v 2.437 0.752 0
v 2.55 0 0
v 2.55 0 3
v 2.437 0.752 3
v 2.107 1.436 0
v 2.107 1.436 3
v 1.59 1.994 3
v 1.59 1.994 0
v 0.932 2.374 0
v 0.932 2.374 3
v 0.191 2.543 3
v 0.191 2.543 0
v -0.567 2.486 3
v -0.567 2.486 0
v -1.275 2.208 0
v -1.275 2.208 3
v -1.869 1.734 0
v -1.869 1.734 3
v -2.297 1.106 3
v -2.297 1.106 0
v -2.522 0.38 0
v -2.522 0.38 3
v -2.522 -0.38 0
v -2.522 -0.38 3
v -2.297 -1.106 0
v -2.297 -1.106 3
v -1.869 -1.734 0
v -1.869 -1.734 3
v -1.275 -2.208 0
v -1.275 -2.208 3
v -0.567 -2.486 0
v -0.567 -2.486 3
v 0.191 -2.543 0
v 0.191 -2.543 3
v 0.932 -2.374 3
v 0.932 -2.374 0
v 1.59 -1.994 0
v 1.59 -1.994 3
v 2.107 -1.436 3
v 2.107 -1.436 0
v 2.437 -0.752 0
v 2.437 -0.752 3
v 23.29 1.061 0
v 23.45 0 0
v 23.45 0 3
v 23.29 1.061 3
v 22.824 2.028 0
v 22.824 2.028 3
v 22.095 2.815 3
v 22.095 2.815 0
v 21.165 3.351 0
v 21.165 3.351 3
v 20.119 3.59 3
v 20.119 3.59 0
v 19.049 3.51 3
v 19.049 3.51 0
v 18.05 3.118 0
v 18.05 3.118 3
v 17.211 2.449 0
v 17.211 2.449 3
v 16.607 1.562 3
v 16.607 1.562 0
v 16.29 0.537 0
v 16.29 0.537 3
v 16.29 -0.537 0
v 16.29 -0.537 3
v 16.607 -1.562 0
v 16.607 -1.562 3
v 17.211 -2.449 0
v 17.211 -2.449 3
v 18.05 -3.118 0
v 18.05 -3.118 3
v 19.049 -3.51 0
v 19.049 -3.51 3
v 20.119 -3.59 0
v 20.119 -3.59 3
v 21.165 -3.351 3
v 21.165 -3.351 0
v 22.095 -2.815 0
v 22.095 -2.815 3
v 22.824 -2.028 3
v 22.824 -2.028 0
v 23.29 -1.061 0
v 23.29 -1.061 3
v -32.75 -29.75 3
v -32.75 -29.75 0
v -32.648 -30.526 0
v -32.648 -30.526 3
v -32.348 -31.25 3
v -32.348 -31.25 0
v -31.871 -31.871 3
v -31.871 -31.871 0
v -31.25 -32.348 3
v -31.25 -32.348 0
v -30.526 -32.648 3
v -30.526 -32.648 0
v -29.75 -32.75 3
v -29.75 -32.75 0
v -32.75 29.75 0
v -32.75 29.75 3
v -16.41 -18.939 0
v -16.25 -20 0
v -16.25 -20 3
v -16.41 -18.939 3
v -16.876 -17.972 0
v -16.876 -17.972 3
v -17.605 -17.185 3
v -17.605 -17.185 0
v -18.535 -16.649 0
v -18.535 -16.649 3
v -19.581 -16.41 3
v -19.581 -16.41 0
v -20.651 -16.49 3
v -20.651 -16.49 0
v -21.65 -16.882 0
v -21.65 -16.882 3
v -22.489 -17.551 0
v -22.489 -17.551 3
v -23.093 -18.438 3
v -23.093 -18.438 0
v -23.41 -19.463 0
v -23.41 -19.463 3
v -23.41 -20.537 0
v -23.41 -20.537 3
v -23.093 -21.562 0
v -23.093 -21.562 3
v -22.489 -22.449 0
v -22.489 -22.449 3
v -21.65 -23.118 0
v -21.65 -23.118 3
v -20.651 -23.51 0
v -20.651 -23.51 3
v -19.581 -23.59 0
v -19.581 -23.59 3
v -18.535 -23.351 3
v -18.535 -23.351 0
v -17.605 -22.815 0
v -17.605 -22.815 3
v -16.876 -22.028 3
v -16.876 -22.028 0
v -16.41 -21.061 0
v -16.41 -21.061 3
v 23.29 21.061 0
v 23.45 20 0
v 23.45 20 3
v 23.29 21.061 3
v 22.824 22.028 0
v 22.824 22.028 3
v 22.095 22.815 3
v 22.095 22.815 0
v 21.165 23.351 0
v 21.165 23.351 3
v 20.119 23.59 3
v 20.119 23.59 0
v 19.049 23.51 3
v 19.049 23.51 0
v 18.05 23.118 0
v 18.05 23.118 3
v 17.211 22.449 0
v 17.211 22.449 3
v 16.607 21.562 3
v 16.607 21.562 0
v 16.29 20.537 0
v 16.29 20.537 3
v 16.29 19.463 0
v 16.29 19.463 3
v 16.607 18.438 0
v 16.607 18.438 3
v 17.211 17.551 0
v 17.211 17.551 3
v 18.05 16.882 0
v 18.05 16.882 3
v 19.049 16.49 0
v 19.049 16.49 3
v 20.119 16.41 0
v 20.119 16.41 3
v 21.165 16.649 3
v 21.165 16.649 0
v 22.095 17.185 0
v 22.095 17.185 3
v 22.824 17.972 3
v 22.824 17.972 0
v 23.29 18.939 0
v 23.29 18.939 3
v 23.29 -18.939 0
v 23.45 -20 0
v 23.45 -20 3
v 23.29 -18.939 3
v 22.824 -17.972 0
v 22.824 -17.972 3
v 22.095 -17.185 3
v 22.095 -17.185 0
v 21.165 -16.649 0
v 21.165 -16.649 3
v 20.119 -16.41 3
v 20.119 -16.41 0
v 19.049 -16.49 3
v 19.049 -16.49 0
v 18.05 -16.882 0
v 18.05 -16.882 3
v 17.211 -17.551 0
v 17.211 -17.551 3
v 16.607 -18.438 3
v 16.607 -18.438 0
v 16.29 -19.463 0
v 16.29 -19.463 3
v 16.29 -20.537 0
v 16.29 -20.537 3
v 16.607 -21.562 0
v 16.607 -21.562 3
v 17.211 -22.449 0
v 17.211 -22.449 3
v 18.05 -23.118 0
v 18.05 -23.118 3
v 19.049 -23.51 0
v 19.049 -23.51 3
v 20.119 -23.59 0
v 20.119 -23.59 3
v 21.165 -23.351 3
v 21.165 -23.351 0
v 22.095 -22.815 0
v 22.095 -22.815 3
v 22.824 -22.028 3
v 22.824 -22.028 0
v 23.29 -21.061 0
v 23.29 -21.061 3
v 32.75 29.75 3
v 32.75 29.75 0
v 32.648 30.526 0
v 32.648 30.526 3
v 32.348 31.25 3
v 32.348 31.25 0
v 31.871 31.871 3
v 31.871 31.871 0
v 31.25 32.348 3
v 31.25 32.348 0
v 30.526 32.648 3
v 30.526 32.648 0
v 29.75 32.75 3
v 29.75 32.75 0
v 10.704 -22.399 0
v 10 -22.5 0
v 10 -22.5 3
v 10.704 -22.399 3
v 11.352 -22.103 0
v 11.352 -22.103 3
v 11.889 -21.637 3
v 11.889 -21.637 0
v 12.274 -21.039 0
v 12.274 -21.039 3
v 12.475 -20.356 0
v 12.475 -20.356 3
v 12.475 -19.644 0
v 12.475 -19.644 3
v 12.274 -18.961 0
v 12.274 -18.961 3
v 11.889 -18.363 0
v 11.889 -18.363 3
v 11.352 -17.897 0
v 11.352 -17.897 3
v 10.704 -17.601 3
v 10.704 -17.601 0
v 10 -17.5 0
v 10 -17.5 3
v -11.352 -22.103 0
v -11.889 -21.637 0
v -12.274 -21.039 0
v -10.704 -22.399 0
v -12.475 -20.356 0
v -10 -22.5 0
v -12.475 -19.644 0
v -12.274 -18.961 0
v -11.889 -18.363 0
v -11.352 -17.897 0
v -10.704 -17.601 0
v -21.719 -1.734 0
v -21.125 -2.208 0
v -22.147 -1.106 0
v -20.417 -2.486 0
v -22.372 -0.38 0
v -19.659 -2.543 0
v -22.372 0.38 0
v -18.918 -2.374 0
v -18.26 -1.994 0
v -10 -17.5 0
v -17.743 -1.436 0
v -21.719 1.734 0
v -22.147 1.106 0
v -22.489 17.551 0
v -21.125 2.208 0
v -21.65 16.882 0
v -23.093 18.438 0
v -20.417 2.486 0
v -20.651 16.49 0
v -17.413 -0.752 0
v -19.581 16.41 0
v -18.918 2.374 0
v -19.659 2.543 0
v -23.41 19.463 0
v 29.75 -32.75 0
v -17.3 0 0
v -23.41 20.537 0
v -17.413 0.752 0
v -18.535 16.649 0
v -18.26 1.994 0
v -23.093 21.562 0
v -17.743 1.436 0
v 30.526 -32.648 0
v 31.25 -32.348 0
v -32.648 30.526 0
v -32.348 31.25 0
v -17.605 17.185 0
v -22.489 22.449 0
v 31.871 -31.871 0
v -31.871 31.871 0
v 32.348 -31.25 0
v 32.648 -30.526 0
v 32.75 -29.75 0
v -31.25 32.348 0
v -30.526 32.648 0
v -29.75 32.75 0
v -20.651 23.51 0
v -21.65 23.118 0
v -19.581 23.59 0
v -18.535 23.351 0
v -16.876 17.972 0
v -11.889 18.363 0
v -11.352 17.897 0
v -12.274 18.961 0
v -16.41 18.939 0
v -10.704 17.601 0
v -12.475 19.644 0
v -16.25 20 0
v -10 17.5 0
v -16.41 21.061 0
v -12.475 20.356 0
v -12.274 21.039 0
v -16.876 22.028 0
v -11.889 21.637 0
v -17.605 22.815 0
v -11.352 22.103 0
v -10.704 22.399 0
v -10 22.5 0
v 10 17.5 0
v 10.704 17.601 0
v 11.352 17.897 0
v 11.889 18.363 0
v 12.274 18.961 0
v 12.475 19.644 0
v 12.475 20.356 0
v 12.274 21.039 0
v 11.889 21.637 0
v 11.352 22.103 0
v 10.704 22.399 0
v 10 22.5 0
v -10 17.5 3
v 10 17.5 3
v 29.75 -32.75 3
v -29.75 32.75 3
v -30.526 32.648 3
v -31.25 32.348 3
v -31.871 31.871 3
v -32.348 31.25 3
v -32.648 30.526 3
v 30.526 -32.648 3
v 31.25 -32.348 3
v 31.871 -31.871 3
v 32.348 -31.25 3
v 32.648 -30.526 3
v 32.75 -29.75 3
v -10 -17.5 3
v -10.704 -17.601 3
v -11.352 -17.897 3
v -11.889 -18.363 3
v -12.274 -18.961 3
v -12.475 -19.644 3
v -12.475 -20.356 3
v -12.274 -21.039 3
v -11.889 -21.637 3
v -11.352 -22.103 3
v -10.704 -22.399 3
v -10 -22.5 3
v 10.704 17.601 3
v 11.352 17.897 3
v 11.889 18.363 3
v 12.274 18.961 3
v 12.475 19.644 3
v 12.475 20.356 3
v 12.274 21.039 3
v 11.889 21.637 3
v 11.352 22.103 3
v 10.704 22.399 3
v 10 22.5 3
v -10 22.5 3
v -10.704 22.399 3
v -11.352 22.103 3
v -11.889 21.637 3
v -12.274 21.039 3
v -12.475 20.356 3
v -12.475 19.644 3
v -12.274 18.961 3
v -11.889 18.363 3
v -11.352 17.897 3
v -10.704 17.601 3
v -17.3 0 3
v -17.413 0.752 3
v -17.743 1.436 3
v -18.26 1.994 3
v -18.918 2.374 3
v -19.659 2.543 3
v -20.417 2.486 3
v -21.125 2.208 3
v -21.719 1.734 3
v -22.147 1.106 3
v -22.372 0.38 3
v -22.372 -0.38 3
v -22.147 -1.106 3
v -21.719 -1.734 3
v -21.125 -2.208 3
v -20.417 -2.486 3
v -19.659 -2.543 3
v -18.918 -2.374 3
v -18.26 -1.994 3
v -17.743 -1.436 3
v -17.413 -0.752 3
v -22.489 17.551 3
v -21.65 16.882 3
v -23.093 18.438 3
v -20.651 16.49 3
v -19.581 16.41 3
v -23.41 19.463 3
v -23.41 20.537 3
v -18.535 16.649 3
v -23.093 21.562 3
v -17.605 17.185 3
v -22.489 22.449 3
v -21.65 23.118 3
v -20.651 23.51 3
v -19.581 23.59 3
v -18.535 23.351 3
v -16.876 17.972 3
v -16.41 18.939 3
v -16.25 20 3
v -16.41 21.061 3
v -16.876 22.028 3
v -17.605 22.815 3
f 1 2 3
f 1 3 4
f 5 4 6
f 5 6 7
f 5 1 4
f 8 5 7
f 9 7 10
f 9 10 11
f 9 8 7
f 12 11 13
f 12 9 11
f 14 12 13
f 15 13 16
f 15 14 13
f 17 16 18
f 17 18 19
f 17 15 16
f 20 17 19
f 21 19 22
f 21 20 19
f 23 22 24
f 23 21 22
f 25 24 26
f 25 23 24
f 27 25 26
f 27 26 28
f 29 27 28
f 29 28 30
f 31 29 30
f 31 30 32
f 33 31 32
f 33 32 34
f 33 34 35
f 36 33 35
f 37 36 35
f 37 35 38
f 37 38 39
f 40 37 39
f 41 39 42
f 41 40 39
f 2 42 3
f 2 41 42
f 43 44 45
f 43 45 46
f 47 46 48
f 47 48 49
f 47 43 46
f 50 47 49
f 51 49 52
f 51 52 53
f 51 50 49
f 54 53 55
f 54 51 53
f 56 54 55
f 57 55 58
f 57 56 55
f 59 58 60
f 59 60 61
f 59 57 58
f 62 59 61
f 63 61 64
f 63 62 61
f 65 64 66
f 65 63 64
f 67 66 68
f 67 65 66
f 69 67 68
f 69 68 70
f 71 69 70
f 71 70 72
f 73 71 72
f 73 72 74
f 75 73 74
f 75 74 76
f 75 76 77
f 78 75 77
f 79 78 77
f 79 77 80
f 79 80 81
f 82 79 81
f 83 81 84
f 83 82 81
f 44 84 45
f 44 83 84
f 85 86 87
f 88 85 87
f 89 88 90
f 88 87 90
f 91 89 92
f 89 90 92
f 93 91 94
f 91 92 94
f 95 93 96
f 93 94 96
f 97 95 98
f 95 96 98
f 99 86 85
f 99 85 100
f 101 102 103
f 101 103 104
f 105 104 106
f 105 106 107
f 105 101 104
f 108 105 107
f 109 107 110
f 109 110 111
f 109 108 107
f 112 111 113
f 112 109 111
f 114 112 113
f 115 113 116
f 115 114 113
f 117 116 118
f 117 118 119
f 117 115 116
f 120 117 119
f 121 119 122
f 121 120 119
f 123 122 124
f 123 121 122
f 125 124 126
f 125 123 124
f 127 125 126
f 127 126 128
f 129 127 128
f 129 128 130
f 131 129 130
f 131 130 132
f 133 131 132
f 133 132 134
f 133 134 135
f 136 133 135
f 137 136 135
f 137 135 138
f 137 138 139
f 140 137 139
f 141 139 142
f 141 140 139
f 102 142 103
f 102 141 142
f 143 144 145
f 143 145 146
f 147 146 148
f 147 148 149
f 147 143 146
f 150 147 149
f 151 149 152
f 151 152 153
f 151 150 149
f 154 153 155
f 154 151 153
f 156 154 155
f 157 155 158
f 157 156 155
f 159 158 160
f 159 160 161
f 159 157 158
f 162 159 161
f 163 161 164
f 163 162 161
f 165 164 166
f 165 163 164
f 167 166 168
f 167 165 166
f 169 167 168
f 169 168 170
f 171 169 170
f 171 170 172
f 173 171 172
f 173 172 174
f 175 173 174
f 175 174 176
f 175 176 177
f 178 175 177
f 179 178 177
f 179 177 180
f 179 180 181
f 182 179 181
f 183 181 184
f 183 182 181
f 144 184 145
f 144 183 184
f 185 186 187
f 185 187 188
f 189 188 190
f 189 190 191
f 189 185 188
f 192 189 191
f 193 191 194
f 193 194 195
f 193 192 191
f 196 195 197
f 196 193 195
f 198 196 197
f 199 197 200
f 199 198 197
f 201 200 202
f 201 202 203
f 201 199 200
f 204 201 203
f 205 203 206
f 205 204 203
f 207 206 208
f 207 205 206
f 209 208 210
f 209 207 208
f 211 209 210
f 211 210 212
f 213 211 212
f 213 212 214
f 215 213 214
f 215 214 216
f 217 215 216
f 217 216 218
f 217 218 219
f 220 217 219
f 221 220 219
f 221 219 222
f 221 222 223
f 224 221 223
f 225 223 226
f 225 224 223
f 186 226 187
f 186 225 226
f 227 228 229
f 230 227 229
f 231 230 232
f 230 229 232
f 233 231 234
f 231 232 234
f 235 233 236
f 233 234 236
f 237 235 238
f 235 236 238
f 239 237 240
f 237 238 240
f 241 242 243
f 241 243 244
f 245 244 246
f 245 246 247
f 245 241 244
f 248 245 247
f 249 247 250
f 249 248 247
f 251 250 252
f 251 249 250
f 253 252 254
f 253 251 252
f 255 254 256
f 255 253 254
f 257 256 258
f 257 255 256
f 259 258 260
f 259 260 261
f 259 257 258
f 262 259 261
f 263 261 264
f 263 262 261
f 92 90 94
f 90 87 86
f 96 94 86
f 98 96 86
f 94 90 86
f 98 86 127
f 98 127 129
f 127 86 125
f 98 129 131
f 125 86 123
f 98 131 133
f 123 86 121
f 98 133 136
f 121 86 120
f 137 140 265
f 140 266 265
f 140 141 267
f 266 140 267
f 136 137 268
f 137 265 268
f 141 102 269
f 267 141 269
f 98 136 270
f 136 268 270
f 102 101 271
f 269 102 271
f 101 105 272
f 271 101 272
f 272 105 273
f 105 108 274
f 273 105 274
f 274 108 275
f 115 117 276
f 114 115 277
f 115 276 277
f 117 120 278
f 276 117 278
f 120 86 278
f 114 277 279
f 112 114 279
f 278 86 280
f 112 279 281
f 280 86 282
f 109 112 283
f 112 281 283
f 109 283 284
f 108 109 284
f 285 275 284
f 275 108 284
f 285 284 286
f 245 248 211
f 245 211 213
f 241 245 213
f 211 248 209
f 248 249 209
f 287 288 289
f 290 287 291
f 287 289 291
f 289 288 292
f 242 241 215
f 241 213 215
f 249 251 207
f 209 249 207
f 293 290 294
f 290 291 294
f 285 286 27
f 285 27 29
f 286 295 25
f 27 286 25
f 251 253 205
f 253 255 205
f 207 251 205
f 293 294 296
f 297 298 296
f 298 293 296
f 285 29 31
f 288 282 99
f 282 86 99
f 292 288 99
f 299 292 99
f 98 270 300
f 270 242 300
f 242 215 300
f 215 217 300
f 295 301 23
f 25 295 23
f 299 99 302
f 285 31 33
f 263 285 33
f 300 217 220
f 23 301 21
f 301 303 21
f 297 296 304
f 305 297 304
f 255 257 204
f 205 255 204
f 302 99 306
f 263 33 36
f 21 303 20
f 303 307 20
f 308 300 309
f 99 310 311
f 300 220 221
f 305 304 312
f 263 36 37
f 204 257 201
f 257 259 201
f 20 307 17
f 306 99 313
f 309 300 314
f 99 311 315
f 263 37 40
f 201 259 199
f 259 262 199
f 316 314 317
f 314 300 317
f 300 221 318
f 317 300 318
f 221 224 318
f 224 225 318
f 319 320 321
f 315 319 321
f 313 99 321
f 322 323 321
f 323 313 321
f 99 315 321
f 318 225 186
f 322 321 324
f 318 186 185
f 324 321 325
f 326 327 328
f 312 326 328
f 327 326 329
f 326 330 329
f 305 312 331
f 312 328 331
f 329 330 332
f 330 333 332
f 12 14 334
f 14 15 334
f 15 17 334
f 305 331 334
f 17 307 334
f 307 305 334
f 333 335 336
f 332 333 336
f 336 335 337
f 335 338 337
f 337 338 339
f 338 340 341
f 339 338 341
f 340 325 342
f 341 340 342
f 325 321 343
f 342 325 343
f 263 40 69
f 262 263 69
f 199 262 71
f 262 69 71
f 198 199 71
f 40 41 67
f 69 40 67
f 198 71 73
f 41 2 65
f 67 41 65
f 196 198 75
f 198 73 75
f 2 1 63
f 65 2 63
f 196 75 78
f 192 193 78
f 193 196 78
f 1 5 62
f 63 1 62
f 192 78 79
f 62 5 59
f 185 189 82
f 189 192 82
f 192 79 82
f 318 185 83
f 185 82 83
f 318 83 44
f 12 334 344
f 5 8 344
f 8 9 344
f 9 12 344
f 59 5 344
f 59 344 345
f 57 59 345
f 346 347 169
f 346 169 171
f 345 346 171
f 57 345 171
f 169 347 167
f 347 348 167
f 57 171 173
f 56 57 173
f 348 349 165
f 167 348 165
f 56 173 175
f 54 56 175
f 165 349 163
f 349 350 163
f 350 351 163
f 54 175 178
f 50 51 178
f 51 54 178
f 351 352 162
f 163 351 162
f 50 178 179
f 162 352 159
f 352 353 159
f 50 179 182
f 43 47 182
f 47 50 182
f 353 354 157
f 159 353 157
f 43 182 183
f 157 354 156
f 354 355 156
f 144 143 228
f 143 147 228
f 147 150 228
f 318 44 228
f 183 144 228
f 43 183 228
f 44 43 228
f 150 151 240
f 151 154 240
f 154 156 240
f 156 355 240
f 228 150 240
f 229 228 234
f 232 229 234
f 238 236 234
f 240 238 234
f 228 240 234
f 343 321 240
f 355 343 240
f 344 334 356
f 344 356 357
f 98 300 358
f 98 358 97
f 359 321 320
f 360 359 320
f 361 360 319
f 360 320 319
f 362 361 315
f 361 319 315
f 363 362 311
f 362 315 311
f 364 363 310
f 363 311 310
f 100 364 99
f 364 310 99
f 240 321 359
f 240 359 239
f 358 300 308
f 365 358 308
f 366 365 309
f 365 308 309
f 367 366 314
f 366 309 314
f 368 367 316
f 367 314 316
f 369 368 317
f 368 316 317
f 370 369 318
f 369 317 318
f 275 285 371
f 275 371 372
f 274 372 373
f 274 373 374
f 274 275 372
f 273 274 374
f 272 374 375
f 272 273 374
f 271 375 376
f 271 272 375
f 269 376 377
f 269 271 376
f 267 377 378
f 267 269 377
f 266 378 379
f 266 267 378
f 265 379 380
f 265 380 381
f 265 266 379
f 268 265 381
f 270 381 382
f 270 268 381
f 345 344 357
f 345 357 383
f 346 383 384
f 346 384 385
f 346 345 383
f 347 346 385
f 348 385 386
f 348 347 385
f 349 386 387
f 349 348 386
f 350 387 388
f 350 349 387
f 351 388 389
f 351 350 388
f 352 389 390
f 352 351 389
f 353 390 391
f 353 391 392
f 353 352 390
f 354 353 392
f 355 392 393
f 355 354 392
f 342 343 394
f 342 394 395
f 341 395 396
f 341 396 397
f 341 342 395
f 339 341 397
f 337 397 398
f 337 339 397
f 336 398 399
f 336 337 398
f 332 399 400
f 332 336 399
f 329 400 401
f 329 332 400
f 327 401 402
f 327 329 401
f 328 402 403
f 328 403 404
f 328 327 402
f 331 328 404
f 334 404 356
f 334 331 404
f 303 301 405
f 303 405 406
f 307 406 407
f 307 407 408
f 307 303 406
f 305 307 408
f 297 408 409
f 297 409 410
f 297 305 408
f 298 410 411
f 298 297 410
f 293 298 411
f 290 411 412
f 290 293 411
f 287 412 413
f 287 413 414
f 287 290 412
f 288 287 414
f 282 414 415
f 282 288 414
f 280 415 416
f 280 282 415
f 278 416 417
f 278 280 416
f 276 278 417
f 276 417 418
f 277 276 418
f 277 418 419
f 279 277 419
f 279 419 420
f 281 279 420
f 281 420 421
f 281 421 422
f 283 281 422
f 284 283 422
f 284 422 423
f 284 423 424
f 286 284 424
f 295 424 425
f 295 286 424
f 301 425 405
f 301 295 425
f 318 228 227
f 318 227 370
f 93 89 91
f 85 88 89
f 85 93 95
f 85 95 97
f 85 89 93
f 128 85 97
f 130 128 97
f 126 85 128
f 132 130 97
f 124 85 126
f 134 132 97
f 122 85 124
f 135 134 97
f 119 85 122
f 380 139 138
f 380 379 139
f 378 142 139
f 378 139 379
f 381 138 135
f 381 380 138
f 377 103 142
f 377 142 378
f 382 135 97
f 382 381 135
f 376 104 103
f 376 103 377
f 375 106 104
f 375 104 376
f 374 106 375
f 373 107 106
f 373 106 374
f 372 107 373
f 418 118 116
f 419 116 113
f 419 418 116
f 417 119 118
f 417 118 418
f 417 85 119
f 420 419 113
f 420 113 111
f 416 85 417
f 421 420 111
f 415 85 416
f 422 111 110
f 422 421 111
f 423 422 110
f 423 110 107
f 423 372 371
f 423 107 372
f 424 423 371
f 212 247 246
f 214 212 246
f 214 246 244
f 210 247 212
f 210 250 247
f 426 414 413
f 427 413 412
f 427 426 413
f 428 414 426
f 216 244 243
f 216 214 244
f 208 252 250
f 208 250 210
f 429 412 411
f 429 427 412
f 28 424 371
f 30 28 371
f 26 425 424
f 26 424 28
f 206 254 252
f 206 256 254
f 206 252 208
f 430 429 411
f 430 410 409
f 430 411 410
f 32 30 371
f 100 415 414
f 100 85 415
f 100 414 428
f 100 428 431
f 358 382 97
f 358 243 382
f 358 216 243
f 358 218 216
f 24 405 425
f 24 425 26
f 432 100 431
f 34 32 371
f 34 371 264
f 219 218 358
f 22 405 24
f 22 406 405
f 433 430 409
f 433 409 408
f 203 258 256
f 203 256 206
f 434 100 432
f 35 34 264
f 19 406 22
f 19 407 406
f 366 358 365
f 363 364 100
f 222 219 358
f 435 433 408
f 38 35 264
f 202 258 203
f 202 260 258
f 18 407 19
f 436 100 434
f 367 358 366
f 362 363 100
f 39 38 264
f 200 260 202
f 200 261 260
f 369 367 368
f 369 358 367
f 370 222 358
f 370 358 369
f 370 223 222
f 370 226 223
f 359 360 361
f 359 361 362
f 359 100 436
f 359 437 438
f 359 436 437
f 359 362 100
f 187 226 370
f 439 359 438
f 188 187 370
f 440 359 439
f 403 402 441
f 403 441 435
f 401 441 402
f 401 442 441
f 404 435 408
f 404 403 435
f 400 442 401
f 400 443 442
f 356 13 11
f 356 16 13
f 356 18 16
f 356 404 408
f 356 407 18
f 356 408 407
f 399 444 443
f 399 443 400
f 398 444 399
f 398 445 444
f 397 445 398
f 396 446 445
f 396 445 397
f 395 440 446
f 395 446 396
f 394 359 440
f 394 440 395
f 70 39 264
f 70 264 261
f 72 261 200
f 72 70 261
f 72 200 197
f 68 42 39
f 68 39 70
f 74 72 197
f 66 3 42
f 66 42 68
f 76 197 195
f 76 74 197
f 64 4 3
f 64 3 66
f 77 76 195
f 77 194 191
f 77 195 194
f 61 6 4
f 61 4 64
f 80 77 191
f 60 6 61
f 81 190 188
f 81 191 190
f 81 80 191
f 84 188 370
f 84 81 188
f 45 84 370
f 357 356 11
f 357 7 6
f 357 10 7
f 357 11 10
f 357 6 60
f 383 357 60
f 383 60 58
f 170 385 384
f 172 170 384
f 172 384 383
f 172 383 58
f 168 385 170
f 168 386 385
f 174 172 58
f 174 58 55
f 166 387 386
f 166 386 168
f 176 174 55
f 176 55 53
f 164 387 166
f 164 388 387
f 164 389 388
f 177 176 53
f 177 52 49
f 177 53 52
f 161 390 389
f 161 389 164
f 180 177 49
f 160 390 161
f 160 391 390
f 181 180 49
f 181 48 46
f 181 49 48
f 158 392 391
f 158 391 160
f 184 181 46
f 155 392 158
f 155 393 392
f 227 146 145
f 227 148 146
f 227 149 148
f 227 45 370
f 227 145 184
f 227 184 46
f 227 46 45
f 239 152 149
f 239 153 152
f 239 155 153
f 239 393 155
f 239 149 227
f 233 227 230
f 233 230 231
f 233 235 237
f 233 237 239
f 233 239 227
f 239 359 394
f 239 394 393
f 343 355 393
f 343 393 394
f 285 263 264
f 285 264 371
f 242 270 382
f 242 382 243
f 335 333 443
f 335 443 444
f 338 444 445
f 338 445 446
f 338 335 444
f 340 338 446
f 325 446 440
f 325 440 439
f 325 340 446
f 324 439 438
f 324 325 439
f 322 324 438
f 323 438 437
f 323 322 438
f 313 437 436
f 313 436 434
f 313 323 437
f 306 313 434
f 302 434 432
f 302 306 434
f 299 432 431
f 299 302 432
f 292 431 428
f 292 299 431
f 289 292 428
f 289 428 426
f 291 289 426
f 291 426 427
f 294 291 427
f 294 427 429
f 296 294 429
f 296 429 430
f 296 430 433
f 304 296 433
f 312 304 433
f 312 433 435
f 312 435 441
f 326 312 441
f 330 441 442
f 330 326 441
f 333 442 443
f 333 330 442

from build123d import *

# Parameters (mm, degrees)
SKETCH_R   = 2.55
SKETCH_R_2 = 3.6
PAD_DEPTH  = 3


with BuildPart() as part:
    # Sketch → Pad (new body)
    with BuildSketch(Plane.XY):
        with BuildLine():
            ThreePointArc((-29.75, 32.75), (-31.87132, 31.87132), (-32.75, 29.75))
            Line((-32.75, -29.75), (-32.75, 29.75))
            ThreePointArc((-32.75, -29.75), (-31.87132, -31.87132), (-29.75, -32.75))
            Line((29.75, -32.75), (-29.75, -32.75))
            ThreePointArc((29.75, -32.75), (31.87132, -31.87132), (32.75, -29.75))
            Line((32.75, 29.75), (32.75, -29.75))
            ThreePointArc((32.75, 29.75), (31.87132, 31.87132), (29.75, 32.75))
            Line((-29.75, 32.75), (29.75, 32.75))
        make_face()
        Circle(SKETCH_R, mode=Mode.SUBTRACT)
        with Locations((-19.85, -20)):
            Circle(SKETCH_R_2, mode=Mode.SUBTRACT)
        with Locations((19.85, -20)):
            Circle(SKETCH_R_2, mode=Mode.SUBTRACT)
        with Locations((19.85, 20)):
            Circle(SKETCH_R_2, mode=Mode.SUBTRACT)
        with Locations((-19.85, 20)):
            Circle(SKETCH_R_2, mode=Mode.SUBTRACT)
        with Locations((-19.85, 0)):
            Circle(SKETCH_R, mode=Mode.SUBTRACT)
        with Locations((19.85, 0)):
            Circle(SKETCH_R_2, mode=Mode.SUBTRACT)
        with BuildLine():
            ThreePointArc((-10, -17.5), (-12.5, -20), (-10, -22.5))
            Line((-10, -22.5), (10, -22.5))
            ThreePointArc((10, -22.5), (12.5, -20), (10, -17.5))
            Line((10, -17.5), (-10, -17.5))
        make_face(mode=Mode.SUBTRACT)
        with BuildLine():
            ThreePointArc((-10, 22.5), (-12.5, 20), (-10, 17.5))
            Line((-10, 17.5), (10, 17.5))
            ThreePointArc((10, 17.5), (12.5, 20), (10, 22.5))
            Line((10, 22.5), (-10, 22.5))
        make_face(mode=Mode.SUBTRACT)
    extrude(amount=PAD_DEPTH)


solid = part.part
